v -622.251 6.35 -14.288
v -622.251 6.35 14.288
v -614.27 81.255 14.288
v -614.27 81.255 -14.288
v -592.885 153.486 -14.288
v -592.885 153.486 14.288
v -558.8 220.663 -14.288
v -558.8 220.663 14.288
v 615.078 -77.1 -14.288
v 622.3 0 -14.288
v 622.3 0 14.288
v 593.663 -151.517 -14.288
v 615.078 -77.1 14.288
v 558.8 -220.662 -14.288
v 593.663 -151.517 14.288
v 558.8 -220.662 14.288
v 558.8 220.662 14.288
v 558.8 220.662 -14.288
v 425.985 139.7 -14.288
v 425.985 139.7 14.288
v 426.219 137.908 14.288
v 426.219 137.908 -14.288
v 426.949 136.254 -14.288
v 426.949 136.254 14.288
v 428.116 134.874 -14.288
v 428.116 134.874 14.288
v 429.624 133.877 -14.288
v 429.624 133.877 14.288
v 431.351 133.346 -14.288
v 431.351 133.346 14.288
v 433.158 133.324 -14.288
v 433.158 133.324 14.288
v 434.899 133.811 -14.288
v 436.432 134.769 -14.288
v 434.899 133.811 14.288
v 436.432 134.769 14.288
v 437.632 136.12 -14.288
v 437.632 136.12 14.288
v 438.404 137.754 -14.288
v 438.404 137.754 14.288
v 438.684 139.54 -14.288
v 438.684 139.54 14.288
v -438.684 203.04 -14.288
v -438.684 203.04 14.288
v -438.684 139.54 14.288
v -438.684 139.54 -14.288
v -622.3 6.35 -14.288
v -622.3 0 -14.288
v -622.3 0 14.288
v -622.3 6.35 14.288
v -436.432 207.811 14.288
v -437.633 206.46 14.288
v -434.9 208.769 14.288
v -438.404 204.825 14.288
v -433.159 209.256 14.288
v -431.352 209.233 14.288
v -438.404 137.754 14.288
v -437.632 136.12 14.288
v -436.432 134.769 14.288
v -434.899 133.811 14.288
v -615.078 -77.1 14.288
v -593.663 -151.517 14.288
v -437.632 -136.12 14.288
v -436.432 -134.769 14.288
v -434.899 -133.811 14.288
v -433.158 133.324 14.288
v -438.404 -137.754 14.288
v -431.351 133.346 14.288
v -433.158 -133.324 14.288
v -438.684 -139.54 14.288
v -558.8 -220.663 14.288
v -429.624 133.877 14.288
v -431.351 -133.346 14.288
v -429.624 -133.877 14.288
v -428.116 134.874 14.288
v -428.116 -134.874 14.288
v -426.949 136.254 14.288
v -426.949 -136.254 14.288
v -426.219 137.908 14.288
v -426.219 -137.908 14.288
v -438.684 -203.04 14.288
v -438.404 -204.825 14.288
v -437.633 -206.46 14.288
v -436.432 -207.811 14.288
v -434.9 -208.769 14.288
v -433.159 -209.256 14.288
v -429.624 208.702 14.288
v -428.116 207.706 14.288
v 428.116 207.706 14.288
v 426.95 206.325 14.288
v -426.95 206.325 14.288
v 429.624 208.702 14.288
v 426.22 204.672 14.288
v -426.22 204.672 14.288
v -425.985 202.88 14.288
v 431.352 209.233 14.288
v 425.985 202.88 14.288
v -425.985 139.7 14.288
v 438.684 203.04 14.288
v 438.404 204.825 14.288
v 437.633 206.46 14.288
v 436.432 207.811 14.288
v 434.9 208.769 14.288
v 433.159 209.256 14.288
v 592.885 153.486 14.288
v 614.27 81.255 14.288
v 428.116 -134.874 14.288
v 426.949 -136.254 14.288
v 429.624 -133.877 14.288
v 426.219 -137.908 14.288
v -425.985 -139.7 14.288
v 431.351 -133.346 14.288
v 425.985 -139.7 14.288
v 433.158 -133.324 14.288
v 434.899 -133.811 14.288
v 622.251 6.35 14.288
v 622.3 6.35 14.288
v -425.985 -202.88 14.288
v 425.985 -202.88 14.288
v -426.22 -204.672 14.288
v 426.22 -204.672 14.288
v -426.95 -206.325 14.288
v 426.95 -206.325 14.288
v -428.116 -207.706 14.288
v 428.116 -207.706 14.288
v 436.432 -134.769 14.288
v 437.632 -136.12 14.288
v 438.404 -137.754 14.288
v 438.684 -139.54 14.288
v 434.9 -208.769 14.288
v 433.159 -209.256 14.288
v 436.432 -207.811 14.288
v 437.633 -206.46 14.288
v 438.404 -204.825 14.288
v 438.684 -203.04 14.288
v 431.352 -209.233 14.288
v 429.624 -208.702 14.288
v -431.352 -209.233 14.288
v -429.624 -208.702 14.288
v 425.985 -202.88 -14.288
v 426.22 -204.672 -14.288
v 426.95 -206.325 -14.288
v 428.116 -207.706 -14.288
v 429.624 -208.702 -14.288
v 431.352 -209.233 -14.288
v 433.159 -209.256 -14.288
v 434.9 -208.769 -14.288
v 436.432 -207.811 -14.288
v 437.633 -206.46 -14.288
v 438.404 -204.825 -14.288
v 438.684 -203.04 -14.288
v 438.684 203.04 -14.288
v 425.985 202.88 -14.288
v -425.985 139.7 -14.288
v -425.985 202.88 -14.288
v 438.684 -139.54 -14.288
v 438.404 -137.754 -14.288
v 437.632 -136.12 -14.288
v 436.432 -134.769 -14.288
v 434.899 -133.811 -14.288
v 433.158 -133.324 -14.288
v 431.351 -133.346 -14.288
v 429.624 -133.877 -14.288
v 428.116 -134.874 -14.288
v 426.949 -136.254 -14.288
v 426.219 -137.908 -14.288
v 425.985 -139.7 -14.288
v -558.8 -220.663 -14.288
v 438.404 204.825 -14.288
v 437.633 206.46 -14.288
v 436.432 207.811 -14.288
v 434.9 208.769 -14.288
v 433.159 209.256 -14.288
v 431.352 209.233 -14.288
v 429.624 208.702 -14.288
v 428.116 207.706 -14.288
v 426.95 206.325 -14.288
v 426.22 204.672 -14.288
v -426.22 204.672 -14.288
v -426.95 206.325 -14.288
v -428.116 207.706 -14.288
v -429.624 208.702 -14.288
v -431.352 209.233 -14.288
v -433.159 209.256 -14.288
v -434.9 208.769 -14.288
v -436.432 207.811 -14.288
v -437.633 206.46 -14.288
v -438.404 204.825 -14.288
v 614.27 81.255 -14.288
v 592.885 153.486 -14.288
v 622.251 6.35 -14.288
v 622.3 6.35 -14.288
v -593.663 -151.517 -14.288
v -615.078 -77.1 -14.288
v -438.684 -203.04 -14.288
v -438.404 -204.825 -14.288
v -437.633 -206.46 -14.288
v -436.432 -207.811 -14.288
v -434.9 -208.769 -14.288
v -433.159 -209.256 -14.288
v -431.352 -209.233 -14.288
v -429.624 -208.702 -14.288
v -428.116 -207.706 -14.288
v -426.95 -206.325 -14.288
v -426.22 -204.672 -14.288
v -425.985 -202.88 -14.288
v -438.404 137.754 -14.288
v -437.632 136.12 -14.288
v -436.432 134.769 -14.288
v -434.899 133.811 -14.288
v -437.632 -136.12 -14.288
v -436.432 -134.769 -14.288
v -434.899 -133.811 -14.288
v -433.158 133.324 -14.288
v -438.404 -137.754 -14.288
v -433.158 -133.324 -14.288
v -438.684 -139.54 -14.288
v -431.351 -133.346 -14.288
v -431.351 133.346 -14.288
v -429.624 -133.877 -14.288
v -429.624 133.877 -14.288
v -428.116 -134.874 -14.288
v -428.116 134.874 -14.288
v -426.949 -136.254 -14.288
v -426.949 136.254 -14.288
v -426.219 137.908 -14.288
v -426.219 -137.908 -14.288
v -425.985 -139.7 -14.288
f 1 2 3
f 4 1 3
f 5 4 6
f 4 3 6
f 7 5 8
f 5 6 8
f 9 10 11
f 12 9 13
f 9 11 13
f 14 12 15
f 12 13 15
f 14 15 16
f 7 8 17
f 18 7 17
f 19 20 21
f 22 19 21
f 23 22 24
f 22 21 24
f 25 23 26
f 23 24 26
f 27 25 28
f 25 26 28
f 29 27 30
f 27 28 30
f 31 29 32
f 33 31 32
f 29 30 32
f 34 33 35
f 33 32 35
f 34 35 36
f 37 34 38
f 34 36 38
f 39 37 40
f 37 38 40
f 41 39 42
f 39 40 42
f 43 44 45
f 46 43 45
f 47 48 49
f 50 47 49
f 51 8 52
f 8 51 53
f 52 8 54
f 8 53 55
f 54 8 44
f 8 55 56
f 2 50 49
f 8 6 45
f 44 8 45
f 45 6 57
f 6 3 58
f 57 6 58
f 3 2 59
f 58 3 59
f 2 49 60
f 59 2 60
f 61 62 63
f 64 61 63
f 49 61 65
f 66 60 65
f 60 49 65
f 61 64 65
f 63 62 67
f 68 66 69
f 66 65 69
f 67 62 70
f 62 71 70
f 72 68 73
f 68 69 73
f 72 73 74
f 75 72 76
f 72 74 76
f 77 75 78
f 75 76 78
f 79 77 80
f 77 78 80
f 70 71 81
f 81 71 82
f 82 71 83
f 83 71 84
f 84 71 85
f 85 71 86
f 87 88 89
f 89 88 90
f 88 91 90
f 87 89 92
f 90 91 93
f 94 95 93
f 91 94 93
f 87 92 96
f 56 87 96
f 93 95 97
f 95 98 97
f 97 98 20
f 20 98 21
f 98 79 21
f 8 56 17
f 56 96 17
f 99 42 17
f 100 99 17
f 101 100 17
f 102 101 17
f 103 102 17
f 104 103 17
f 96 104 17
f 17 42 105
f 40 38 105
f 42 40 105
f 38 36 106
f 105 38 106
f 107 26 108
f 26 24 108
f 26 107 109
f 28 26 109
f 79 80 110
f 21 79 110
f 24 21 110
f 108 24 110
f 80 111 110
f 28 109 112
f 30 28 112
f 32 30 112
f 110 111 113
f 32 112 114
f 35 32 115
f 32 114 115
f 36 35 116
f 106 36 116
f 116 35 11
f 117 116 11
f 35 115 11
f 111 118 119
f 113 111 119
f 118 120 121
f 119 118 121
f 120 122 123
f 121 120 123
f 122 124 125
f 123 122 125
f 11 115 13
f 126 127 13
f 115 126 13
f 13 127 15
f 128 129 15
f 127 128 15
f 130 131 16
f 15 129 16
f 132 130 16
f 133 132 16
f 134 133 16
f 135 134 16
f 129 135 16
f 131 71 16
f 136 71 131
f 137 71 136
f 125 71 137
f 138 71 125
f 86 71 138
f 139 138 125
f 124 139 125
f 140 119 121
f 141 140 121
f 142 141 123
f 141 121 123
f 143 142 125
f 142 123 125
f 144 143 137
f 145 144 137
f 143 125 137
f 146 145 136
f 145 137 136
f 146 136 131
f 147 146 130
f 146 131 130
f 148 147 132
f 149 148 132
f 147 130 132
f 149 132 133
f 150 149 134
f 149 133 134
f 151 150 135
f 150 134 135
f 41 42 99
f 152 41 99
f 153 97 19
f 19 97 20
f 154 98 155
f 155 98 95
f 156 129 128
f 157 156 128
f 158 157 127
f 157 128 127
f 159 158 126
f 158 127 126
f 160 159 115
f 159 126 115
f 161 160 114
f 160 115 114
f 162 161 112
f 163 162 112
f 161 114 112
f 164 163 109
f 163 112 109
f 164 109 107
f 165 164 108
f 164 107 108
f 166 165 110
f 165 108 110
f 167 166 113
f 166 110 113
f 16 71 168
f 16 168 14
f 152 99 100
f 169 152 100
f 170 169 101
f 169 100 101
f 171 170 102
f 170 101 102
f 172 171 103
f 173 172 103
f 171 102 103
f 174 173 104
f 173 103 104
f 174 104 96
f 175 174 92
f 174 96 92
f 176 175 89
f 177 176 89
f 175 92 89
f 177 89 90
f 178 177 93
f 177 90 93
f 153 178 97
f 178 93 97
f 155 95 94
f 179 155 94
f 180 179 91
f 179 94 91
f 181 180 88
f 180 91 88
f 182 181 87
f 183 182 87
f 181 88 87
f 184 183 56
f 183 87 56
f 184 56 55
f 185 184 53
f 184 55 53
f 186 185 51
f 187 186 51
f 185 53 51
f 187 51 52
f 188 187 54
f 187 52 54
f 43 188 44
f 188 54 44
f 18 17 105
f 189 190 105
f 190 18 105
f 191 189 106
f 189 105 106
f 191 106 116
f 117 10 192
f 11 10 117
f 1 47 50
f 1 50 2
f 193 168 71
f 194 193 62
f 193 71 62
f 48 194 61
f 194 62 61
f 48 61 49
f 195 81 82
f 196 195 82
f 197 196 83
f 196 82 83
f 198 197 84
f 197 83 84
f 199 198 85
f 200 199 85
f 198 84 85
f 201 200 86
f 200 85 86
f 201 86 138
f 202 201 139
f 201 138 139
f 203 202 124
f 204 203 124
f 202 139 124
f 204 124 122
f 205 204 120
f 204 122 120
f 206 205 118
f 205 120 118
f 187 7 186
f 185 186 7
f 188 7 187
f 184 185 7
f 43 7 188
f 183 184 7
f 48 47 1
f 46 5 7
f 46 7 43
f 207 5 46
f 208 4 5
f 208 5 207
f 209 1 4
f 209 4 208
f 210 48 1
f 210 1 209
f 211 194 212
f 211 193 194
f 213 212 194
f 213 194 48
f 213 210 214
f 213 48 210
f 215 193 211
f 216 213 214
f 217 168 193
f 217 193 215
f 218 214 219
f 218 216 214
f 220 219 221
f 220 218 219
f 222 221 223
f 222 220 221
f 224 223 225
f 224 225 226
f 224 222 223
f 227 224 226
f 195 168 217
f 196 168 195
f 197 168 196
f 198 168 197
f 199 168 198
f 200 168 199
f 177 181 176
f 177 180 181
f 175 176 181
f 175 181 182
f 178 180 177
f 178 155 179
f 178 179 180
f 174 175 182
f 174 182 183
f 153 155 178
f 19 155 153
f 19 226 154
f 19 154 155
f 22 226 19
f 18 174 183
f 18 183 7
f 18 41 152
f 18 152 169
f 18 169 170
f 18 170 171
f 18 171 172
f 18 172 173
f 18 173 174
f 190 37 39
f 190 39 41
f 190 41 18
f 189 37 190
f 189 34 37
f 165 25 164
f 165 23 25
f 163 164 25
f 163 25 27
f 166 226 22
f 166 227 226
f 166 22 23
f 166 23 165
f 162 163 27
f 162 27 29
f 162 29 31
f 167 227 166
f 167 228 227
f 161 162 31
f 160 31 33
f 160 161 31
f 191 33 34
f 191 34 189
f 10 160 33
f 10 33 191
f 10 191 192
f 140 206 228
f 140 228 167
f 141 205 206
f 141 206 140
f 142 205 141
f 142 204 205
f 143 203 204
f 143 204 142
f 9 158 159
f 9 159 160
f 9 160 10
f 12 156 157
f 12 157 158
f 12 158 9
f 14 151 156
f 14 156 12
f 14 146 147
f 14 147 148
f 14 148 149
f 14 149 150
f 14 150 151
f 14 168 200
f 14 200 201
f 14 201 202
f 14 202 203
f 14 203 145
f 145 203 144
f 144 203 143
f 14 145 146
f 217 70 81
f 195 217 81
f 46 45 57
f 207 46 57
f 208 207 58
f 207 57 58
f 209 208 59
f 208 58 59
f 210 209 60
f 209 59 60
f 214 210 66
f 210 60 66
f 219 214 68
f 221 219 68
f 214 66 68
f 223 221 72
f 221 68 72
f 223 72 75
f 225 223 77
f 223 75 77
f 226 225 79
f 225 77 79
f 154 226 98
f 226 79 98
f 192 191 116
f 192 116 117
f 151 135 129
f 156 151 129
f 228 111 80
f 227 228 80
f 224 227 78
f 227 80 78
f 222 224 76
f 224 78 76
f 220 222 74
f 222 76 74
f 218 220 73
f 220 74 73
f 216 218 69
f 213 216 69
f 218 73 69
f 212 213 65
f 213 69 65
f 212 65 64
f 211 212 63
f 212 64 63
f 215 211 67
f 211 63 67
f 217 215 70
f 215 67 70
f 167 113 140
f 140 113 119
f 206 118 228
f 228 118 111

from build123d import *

# Parameters (mm, degrees)
F0_W     = 1244.6
F0_H     = 28.575
F1_DEPTH = 220.6625
F3_DEPTH = 50.8
F4_DEPTH = 50.8


with BuildPart() as f1:
    # F0 (on Front) → F1 (new body, symmetric)
    with BuildSketch(Plane.XZ):
        Rectangle(F0_W, F0_H)
    extrude(amount=F1_DEPTH, both=True)

    # F2 (on face) → F3 (cut)
    with BuildSketch(Plane.XY.offset(14.2875)):
        with BuildLine():
            ThreePointArc((-438.683658, 139.539675), (-432.254002, 133.270344), (-425.98467, 139.7))
            Line((-425.98467, 139.7), (-425.985175, 202.879553))
            ThreePointArc((-425.985175, 202.879553), (-432.254609, 209.309109), (-438.684165, 203.039675))
            Line((-438.684165, 203.039675), (-438.683658, 139.539675))
        make_face()
        with BuildLine():
            ThreePointArc((-425.98467, -139.7), (-432.254002, -133.270344), (-438.683658, -139.539675))
            Line((-438.683658, -139.539675), (-438.684165, -203.039675))
            ThreePointArc((-438.684165, -203.039675), (-432.254609, -209.309109), (-425.985175, -202.879553))
            Line((-425.985175, -202.879553), (-425.98467, -139.7))
        make_face()
        with BuildLine():
            ThreePointArc((425.98467, 139.7), (432.254002, 133.270344), (438.683658, 139.539675))
            Line((438.683658, 139.539675), (438.684165, 203.039675))
            ThreePointArc((438.684165, 203.039675), (432.254609, 209.309109), (425.985175, 202.879553))
            Line((425.985175, 202.879553), (425.98467, 139.7))
        make_face()
        with BuildLine():
            Line((438.684165, -203.039675), (438.683658, -139.539675))
            ThreePointArc((438.683658, -139.539675), (432.254002, -133.270344), (425.98467, -139.7))
            Line((425.98467, -139.7), (425.985175, -202.879553))
            ThreePointArc((425.985175, -202.879553), (432.254609, -209.309109), (438.684165, -203.039675))
        make_face()
    extrude(amount=-F3_DEPTH, mode=Mode.SUBTRACT)

    # F2 (on face) → F4 (cut)
    with BuildSketch(Plane.XY.offset(14.2875)):
        with BuildLine():
            ThreePointArc((-558.8, -220.6625), (-606.109285, -114.808742), (-622.3, 0))
            Line((-622.3, 0), (-622.3, -220.6625))
            Line((-622.3, -220.6625), (-558.8, -220.6625))
        make_face()
        with BuildLine():
            Line((-622.3, 6.35), (-622.251434, 6.35))
            ThreePointArc((-622.251434, 6.35), (-605.219554, 117.85665), (-558.8, 220.6625))
            Line((-558.8, 220.6625), (-622.3, 220.6625))
            Line((-622.3, 220.6625), (-622.3, 6.35))
        make_face()
        with BuildLine():
            Line((622.3, -220.6625), (622.3, 0))
            ThreePointArc((622.3, 0), (606.109285, -114.808742), (558.8, -220.6625))
            Line((558.8, -220.6625), (622.3, -220.6625))
        make_face()
        with BuildLine():
            Line((622.251434, 6.35), (622.3, 6.35))
            Line((622.3, 6.35), (622.3, 220.6625))
            Line((622.3, 220.6625), (558.8, 220.6625))
            ThreePointArc((558.8, 220.6625), (605.219554, 117.85665), (622.251434, 6.35))
        make_face()
    extrude(amount=-F4_DEPTH, mode=Mode.SUBTRACT)


solid = f1.part
